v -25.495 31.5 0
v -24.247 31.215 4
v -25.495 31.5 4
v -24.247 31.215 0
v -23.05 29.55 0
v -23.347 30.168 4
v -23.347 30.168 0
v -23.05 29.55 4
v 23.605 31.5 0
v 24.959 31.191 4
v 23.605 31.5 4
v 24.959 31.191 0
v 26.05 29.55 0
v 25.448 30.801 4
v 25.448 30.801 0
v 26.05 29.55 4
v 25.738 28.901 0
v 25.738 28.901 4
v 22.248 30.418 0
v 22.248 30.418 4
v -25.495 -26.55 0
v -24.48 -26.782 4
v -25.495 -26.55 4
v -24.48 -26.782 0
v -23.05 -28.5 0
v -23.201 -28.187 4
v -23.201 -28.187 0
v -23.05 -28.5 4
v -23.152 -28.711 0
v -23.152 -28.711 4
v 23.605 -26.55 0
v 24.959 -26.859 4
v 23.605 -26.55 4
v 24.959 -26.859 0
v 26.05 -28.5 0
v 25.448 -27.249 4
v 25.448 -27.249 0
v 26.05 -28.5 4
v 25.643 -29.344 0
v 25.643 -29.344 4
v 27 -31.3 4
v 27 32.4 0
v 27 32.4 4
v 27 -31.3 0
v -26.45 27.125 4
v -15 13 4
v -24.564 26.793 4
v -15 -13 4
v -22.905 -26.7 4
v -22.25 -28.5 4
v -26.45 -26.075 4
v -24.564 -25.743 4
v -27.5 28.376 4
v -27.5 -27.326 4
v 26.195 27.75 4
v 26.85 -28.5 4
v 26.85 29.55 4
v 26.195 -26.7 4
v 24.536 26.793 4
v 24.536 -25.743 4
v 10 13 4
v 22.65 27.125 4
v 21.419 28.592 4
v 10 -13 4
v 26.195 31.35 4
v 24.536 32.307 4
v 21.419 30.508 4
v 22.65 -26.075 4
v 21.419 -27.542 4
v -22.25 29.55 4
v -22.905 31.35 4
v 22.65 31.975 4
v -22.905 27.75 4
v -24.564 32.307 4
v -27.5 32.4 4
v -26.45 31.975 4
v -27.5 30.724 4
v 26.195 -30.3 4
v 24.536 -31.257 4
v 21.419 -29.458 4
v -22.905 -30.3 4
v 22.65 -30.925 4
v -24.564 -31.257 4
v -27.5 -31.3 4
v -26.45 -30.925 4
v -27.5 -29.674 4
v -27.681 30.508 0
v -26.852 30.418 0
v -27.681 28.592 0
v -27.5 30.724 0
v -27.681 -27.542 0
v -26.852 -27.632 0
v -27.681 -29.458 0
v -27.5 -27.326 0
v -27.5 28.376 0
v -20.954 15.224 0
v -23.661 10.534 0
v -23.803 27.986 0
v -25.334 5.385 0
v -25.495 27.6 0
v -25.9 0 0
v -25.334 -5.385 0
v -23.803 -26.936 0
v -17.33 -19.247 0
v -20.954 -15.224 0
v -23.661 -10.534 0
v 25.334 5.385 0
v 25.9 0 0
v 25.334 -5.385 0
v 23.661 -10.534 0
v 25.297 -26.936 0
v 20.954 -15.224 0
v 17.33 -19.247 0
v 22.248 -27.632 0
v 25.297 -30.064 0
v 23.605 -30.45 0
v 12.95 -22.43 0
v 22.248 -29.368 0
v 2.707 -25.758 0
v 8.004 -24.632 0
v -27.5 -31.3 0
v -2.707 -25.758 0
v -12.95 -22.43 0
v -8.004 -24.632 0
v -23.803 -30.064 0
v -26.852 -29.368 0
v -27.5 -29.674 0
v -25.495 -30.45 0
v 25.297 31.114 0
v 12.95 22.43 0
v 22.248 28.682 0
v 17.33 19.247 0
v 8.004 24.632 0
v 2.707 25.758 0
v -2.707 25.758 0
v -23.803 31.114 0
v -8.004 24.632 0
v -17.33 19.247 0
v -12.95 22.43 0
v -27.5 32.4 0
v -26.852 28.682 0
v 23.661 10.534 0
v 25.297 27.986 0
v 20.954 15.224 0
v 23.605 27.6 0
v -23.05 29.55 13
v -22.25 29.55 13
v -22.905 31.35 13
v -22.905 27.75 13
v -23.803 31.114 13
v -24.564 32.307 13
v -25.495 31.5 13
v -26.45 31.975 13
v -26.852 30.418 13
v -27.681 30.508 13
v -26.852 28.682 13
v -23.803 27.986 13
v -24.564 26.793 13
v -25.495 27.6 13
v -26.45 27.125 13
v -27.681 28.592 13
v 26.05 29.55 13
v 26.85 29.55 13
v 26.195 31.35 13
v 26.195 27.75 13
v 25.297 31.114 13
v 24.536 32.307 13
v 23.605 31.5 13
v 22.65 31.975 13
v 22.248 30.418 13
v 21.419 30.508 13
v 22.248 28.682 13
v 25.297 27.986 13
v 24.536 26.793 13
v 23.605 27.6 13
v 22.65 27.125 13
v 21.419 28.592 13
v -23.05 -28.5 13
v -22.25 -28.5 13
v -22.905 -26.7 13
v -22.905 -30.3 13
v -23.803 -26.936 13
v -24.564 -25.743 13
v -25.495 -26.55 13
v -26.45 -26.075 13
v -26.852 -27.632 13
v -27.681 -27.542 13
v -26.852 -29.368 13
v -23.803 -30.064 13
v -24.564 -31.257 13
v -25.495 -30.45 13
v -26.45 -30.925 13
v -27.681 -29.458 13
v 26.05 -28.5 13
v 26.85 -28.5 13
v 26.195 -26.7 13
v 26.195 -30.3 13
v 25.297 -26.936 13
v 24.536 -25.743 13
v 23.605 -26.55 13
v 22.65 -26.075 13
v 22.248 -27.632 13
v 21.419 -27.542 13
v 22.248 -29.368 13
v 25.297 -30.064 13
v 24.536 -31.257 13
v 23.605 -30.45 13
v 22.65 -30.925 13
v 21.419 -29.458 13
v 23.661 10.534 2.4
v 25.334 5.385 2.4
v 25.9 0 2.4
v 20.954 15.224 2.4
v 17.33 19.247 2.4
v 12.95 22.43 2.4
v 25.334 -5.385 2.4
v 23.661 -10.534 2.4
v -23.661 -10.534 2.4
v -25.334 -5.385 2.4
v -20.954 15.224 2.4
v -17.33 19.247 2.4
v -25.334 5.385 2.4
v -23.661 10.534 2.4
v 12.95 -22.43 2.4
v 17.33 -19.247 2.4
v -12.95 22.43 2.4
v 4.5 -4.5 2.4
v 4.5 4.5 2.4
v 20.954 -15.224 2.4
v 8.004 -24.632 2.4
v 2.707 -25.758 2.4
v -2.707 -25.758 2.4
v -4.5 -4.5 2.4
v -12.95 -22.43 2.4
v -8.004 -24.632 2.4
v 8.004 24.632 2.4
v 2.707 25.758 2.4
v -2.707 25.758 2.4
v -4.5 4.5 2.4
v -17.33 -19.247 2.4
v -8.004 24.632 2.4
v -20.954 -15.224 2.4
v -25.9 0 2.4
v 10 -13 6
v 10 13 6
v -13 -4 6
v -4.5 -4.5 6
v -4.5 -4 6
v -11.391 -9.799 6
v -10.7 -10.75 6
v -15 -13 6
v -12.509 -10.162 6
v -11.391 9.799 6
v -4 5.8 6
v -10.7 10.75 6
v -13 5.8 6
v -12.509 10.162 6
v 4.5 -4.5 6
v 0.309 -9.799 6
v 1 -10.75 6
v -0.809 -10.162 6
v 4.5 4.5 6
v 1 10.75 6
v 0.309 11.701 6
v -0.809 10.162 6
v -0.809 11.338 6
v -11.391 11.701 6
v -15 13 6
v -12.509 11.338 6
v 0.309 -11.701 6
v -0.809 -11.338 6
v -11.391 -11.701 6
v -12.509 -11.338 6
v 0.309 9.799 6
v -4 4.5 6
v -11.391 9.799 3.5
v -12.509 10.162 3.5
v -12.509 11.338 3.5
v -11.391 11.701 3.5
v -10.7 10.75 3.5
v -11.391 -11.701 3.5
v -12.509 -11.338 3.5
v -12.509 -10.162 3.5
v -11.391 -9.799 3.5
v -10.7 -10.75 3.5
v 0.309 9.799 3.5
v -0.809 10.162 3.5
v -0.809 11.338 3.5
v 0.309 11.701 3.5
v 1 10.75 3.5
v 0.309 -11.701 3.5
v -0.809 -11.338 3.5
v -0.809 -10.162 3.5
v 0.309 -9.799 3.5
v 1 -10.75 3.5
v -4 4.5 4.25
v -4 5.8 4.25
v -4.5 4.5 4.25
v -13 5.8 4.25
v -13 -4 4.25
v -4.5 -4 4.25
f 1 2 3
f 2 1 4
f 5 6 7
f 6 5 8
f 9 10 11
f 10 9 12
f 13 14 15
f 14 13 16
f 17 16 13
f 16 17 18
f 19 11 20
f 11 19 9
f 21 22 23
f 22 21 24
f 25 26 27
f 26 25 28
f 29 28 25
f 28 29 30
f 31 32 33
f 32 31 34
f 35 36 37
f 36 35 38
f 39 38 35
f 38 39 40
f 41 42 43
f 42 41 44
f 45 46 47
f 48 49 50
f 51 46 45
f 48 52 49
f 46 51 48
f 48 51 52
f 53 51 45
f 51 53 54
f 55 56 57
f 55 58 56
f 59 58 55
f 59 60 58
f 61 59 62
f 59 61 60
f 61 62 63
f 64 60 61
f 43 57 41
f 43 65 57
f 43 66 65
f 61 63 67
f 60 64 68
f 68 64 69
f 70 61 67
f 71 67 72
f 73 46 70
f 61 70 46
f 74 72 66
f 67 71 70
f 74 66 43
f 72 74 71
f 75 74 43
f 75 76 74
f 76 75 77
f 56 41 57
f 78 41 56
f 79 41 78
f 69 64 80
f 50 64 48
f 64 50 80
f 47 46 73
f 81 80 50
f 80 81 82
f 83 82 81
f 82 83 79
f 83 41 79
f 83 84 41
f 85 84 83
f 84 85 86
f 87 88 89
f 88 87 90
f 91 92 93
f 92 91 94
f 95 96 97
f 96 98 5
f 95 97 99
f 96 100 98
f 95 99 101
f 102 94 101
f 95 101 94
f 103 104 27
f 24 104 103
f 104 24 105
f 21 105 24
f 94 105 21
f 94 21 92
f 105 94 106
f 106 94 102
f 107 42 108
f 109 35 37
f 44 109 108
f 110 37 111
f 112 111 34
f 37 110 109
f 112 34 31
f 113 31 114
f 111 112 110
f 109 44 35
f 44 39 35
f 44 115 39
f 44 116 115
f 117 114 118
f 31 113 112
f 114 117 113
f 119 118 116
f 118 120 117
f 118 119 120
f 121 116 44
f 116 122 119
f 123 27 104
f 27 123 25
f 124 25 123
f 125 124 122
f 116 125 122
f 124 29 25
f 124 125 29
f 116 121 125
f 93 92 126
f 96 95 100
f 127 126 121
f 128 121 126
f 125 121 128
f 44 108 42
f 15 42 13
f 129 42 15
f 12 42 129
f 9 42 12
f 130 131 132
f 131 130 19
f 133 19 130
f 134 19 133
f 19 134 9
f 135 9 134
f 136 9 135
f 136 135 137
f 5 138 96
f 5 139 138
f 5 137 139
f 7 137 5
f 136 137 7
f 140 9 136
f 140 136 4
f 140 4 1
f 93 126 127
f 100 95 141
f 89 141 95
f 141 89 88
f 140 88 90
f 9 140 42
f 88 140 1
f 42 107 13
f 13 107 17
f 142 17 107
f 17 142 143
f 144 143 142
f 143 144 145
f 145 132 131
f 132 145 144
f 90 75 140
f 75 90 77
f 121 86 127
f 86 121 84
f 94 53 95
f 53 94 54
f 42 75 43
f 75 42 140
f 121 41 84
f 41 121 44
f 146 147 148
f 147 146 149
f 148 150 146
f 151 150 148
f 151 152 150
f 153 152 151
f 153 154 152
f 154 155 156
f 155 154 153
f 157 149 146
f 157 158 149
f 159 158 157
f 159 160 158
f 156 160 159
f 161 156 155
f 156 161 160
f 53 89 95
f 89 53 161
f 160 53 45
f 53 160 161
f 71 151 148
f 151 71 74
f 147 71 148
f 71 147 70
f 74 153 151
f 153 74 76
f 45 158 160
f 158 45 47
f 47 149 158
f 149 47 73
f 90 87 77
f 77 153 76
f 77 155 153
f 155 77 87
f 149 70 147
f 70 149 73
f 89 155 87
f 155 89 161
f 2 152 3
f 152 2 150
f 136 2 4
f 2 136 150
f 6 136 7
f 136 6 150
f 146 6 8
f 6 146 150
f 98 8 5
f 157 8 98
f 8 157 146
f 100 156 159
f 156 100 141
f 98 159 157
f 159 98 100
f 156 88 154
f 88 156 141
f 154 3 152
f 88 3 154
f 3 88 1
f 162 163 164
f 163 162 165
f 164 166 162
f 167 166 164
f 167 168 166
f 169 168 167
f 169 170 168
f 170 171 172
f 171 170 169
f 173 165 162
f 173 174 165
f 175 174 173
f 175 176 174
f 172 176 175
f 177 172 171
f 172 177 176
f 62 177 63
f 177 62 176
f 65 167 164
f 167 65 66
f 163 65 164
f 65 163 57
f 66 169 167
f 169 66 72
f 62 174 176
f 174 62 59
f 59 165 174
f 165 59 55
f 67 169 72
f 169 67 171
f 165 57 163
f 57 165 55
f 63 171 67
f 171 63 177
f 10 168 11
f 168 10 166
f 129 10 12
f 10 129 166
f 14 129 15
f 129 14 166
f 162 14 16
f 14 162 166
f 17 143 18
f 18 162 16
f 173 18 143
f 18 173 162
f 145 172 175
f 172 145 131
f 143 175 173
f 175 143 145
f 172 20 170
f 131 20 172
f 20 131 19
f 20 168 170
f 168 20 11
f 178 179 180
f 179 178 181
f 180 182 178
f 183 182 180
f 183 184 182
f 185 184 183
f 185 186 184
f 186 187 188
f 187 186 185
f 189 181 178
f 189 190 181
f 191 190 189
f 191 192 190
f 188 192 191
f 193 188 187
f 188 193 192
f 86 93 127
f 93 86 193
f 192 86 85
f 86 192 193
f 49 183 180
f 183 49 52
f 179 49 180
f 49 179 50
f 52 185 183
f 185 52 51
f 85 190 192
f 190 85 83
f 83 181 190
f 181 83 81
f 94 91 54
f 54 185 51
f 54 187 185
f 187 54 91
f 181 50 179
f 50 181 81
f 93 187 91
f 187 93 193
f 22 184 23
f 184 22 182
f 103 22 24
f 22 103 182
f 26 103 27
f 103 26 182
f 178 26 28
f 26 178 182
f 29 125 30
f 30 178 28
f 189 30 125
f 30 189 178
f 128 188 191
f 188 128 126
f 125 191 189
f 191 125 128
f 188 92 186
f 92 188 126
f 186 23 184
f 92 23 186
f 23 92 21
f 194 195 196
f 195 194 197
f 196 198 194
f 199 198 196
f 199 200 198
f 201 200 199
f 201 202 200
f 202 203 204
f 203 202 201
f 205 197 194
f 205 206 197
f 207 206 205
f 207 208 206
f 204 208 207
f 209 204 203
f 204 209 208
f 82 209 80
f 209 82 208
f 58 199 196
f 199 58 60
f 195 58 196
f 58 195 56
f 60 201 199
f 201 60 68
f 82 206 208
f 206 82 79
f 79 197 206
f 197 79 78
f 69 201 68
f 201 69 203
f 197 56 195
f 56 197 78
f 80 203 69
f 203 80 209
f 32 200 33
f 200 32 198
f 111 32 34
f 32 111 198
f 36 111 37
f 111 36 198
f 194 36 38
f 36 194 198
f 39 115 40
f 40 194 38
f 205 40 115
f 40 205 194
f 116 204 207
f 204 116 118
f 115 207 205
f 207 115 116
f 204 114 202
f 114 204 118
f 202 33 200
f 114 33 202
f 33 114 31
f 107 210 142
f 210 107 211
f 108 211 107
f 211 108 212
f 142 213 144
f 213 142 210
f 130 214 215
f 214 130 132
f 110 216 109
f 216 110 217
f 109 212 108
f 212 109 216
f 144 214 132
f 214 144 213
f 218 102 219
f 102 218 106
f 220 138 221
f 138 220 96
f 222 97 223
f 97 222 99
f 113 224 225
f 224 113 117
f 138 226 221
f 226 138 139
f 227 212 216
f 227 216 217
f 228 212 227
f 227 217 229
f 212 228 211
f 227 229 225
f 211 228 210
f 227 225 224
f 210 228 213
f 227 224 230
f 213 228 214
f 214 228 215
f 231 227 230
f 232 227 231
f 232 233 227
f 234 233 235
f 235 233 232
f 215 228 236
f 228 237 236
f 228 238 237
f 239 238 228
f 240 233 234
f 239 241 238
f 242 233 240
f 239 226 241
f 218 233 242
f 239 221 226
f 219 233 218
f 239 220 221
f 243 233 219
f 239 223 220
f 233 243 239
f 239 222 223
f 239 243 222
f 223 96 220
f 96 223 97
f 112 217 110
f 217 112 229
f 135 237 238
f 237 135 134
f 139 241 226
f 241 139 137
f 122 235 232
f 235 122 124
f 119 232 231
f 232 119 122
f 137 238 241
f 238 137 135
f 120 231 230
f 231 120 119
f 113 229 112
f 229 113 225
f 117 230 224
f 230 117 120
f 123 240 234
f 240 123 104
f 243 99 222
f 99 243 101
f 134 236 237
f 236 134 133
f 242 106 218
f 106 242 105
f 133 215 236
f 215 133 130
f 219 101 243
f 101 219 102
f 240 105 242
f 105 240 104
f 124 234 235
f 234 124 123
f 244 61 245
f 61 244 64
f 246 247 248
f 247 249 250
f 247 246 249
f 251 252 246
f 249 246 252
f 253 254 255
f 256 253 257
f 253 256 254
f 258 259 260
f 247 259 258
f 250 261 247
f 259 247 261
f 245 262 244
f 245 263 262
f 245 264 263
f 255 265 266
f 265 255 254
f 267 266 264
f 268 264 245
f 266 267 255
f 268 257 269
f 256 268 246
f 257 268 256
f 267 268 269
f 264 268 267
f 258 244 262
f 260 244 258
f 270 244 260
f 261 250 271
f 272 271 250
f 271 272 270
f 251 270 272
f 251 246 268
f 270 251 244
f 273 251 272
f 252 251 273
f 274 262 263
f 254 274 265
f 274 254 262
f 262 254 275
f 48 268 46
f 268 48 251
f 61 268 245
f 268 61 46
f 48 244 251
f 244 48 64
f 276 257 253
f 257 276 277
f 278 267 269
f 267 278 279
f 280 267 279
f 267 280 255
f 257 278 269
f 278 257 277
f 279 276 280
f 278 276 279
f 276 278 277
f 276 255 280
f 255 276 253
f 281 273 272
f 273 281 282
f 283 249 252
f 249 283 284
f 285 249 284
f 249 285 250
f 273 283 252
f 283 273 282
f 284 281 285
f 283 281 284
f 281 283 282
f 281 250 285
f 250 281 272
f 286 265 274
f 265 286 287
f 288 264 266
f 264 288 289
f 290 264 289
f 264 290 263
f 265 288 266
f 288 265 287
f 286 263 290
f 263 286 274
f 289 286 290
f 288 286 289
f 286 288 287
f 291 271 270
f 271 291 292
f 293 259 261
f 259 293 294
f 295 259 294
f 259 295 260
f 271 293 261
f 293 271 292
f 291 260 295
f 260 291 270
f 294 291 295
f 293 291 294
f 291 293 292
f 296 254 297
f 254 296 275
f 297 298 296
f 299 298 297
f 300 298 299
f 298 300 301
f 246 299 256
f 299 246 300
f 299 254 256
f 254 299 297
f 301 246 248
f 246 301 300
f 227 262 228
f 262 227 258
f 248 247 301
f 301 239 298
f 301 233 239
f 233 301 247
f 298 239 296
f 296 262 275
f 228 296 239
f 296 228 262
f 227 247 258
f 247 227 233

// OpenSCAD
pared = 4;
pared2 = 2*pared;
medPared = pared/2;

raspX = 56;//58
raspY = 85;//85
raspZ = 15.5;//15.5
raspD1 = 3.45;
raspDP = 22;
raspD2 = raspDP+pared2;//Altura lados
raspAlza = 13-pared;
raspCamTor = 1;


difference()
{
creaBaseMesa();
translate([-9/2,-9/2,-0.1])

cube([9,9,15]);

tornillosCam();

}

module tornillosCam()
{
translate([-11.7,10.75,3.5])
cylinder(r=raspCamTor,5);

translate([-11.7,-10.75,3.5])
cylinder(r=raspCamTor,5);

translate([0,10.75,3.5])
cylinder(r=raspCamTor,5);

translate([0,-10.75,3.5])
cylinder(r=raspCamTor,5);

translate([-13,-4,4.25])
cube([9,9.8,4]);


}


module creaBaseMesa()
{
translate([-15,-13,3])
cube([25,26,3]);

difference()
{

translate([-28.5,-52,0])
crearMesa();

translate([0,0,-0.1])
cylinder(r=51.8/2,2.5);

}
}


module crearMesa()
{

difference()
{
translate([1,20.7,0])
cube([54.5,63.7,pared]);

translate([0,0,-0.1])
cuatroTornHue(2.8);
}

cuatroTorn(2.8);




}






module cuatroTorn(radio)
{
	translate([raspD1,raspY-raspD1,0])
	cylHue(pared+raspAlza,radio);

	translate([raspX-raspD1,raspY-raspD1,0])
	cylHue(pared+raspAlza,radio);

	translate([raspD1,23.5,0])
	cylHue(pared+raspAlza,radio);

	translate([raspX-raspD1,23.5,0])
	cylHue(pared+raspAlza,radio);

}


module cuatroTornHue(radio)
{
	translate([raspD1,raspY-raspD1,0])
	cylHue2(pared+raspAlza,radio);

	translate([raspX-raspD1,raspY-raspD1,0])
	cylHue2(pared+raspAlza,radio);

	translate([raspD1,23.5,0])
	cylHue2(pared+raspAlza,radio);

	translate([raspX-raspD1,23.5,0])
	cylHue2(pared+raspAlza,radio);

}


module cylHue(h,radio){
	difference()
	{
		cylinder(r=radio,h);
		translate([0,0,-1])
		cylinder(r=2,h*2);
	}
}

module cylHue2(h,radio){
	cylinder(r=2,h);
}
